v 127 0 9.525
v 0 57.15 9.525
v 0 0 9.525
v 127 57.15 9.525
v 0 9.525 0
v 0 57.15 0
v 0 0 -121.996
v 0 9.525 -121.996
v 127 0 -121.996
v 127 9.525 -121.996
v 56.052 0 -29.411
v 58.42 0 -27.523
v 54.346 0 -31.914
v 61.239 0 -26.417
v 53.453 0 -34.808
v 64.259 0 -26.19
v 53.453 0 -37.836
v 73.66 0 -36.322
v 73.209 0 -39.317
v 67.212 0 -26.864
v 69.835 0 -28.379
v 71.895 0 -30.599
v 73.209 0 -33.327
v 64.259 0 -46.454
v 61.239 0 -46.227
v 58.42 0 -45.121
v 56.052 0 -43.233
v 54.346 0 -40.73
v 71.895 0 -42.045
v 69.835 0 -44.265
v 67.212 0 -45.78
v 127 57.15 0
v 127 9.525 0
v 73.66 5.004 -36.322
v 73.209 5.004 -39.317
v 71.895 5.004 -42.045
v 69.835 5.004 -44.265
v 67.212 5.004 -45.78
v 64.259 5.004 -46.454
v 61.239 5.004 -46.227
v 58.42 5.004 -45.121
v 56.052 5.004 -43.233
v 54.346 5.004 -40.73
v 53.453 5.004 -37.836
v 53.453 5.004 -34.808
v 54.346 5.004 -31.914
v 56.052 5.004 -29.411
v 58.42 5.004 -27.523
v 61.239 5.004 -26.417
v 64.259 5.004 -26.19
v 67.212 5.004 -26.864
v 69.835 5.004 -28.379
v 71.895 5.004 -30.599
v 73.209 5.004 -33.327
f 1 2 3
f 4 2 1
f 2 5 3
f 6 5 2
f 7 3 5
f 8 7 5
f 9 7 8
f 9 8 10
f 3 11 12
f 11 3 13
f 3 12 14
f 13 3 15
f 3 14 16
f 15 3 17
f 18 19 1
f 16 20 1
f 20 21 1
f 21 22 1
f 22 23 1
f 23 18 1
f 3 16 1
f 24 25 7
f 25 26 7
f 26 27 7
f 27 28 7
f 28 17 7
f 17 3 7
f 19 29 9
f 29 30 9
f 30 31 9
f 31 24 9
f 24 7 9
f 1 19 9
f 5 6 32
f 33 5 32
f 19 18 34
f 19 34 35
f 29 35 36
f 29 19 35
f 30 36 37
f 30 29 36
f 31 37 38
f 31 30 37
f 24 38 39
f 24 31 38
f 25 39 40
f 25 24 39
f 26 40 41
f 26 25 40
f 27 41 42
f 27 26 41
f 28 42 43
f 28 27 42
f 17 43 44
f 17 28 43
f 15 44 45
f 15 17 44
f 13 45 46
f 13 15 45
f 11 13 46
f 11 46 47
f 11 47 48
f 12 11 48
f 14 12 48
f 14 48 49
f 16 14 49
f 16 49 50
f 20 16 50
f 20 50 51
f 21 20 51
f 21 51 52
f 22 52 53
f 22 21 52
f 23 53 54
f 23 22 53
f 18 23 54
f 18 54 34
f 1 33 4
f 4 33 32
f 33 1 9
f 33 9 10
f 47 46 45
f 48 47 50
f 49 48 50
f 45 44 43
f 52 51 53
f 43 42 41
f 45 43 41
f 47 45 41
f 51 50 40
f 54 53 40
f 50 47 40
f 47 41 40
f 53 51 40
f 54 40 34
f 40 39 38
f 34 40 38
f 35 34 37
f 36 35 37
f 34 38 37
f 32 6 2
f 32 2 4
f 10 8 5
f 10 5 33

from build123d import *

# Parameters (mm, degrees)
SKETCH1_W           = 127
SKETCH1_H           = 57.15
BOSS_EXTRUDE1_DEPTH = 9.525
SKETCH2_W           = 127
SKETCH2_H           = 127
BOSS_EXTRUDE3_DEPTH = 9.525
SKETCH3_R           = 10.16
CUT_EXTRUDE1_DEPTH  = 5.0038


with BuildPart() as part:
    # Sketch1 → Boss-Extrude1 (new body)
    with BuildSketch(Plane.XY):
        with Locations((63.5, 28.575)):
            Rectangle(SKETCH1_W, SKETCH1_H)
    extrude(amount=BOSS_EXTRUDE1_DEPTH)

    # Sketch2 → Boss-Extrude3 (add)
    with BuildSketch(Plane(origin=(0, 0, 0), x_dir=(1, 0, 0), z_dir=(0, 1, 0))):
        with Locations((63.5, 58.4962)):
            Rectangle(SKETCH2_W, SKETCH2_H)
    extrude(amount=BOSS_EXTRUDE3_DEPTH)

    # Sketch3 → Cut-Extrude1 (cut)
    with BuildSketch(Plane(origin=(0, 0, 0), x_dir=(1, 0, 0), z_dir=(0, 1, 0))):
        with Locations((63.5, 36.322)):
            Circle(SKETCH3_R)
    extrude(amount=CUT_EXTRUDE1_DEPTH, mode=Mode.SUBTRACT)


solid = part.part
